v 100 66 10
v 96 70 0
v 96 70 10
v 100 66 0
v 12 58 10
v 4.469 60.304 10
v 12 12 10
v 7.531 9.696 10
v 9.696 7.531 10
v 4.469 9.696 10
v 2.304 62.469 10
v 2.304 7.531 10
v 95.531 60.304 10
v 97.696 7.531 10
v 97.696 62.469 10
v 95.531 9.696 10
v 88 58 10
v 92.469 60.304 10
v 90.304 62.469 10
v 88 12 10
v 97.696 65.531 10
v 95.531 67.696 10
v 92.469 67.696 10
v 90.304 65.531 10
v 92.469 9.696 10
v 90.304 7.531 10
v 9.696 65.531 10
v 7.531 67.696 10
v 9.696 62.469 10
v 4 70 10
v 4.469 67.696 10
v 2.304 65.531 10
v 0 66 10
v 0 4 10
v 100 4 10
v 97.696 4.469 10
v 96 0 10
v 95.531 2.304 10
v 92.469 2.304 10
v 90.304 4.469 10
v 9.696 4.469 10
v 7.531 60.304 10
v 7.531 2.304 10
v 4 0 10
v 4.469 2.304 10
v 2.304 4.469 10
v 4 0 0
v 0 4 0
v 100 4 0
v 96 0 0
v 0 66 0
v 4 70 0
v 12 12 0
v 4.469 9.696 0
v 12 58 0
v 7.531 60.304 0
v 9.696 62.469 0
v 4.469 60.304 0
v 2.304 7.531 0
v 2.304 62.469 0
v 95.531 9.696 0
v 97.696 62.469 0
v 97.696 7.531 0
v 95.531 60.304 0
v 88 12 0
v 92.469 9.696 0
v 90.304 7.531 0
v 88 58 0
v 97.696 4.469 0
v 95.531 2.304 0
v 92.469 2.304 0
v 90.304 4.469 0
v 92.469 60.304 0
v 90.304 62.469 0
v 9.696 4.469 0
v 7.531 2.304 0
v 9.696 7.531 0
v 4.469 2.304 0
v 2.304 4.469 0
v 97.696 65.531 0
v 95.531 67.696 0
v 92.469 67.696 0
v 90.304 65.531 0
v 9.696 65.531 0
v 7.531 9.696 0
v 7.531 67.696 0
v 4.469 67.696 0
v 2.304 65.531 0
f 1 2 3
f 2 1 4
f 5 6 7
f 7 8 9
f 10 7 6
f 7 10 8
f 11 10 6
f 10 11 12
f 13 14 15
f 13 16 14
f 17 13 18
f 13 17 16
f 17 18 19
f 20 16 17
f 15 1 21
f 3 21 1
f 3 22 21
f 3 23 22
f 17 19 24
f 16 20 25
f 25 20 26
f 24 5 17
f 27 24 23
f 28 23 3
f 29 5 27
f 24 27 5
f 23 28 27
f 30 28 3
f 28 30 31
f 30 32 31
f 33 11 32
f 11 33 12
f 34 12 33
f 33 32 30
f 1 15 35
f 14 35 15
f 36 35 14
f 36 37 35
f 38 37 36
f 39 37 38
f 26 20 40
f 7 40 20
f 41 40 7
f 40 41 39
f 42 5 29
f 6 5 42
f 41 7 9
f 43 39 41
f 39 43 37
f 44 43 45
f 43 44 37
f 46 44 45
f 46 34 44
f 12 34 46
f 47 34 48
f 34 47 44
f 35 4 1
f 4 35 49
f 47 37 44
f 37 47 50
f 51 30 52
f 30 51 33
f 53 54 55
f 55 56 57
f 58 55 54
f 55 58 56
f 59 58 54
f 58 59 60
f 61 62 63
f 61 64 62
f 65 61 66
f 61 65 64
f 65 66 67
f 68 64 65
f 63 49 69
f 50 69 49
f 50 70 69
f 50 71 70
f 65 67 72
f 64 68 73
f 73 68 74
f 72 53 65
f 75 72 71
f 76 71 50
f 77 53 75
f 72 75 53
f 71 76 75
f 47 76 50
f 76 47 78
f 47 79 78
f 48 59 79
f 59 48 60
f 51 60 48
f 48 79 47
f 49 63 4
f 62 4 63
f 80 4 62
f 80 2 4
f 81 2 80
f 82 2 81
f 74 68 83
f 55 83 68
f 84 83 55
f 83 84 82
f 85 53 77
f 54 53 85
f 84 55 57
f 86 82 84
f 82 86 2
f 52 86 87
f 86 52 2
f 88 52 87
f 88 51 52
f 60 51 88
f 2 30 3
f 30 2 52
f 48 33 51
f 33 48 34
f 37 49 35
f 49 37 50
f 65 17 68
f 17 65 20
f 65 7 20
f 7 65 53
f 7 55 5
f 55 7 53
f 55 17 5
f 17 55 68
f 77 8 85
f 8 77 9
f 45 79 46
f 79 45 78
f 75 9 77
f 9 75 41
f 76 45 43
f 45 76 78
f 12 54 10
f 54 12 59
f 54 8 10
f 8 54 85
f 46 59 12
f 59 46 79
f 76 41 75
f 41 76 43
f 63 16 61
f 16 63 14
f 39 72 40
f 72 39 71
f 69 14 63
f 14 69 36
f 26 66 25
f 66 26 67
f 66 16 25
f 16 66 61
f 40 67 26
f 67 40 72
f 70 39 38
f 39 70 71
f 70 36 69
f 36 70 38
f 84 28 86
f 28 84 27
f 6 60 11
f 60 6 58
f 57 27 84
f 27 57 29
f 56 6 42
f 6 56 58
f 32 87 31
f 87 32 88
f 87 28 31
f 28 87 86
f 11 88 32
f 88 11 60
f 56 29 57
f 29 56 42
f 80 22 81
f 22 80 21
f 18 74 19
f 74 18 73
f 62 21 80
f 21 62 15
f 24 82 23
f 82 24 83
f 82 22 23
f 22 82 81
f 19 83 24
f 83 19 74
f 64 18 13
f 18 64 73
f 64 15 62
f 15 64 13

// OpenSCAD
$fn = 32;

// ----------------------------------------------------------------------
// Frame plate: 100 x 70 frame, 12 mm rails
// ----------------------------------------------------------------------

// --- parameters (mm) ---
plate_l = 100;            // plate length, X
plate_w = 70;             // plate width, Y
plate_t = 10;             // plate thickness, Z (extrusion height)
corner_c = 4;             // corner chamfer
frame_bar = 12;           // frame rail width
bolt_r = 4;               // corner bolt window radius
bolt_inset = 6;           // bolt centre inset from the edges

win_l = plate_l - 2 * frame_bar;  // window length
win_w = plate_w - 2 * frame_bar;  // window width
bolt_d = 2 * bolt_r;  // corner hole diameter

profile = [[4, 0], [96, 0], [100, 4], [100, 66], [96, 70], [4, 70], [0, 66], [0, 4]];  // primary outline, 8 points, counter clockwise
void_1 = [[12, 12], [88, 12], [88, 58], [12, 58]];  // the window, 4 points
void_2 = [[9.696, 7.531], [7.531, 9.696], [4.469, 9.696], [2.304, 7.531], [2.304, 4.469], [4.469, 2.304], [7.531, 2.304], [9.696, 4.469]];  // corner bolt window, 8 points
void_3 = [[97.696, 7.531], [95.531, 9.696], [92.469, 9.696], [90.304, 7.531], [90.304, 4.469], [92.469, 2.304], [95.531, 2.304], [97.696, 4.469]];  // corner bolt window, 8 points
void_4 = [[9.696, 65.531], [7.531, 67.696], [4.469, 67.696], [2.304, 65.531], [2.304, 62.469], [4.469, 60.304], [7.531, 60.304], [9.696, 62.469]];  // corner bolt window, 8 points
void_5 = [[97.696, 65.531], [95.531, 67.696], [92.469, 67.696], [90.304, 65.531], [90.304, 62.469], [92.469, 60.304], [95.531, 60.304], [97.696, 62.469]];  // corner bolt window, 8 points

// --- the one profile operation ---
difference() {
  linear_extrude(height = plate_t) polygon(points = profile);
  translate([0, 0, -1])
    linear_extrude(height = plate_t + 2) polygon(points = void_1);
  translate([0, 0, -1])
    linear_extrude(height = plate_t + 2) polygon(points = void_2);
  translate([0, 0, -1])
    linear_extrude(height = plate_t + 2) polygon(points = void_3);
  translate([0, 0, -1])
    linear_extrude(height = plate_t + 2) polygon(points = void_4);
  translate([0, 0, -1])
    linear_extrude(height = plate_t + 2) polygon(points = void_5);
}
